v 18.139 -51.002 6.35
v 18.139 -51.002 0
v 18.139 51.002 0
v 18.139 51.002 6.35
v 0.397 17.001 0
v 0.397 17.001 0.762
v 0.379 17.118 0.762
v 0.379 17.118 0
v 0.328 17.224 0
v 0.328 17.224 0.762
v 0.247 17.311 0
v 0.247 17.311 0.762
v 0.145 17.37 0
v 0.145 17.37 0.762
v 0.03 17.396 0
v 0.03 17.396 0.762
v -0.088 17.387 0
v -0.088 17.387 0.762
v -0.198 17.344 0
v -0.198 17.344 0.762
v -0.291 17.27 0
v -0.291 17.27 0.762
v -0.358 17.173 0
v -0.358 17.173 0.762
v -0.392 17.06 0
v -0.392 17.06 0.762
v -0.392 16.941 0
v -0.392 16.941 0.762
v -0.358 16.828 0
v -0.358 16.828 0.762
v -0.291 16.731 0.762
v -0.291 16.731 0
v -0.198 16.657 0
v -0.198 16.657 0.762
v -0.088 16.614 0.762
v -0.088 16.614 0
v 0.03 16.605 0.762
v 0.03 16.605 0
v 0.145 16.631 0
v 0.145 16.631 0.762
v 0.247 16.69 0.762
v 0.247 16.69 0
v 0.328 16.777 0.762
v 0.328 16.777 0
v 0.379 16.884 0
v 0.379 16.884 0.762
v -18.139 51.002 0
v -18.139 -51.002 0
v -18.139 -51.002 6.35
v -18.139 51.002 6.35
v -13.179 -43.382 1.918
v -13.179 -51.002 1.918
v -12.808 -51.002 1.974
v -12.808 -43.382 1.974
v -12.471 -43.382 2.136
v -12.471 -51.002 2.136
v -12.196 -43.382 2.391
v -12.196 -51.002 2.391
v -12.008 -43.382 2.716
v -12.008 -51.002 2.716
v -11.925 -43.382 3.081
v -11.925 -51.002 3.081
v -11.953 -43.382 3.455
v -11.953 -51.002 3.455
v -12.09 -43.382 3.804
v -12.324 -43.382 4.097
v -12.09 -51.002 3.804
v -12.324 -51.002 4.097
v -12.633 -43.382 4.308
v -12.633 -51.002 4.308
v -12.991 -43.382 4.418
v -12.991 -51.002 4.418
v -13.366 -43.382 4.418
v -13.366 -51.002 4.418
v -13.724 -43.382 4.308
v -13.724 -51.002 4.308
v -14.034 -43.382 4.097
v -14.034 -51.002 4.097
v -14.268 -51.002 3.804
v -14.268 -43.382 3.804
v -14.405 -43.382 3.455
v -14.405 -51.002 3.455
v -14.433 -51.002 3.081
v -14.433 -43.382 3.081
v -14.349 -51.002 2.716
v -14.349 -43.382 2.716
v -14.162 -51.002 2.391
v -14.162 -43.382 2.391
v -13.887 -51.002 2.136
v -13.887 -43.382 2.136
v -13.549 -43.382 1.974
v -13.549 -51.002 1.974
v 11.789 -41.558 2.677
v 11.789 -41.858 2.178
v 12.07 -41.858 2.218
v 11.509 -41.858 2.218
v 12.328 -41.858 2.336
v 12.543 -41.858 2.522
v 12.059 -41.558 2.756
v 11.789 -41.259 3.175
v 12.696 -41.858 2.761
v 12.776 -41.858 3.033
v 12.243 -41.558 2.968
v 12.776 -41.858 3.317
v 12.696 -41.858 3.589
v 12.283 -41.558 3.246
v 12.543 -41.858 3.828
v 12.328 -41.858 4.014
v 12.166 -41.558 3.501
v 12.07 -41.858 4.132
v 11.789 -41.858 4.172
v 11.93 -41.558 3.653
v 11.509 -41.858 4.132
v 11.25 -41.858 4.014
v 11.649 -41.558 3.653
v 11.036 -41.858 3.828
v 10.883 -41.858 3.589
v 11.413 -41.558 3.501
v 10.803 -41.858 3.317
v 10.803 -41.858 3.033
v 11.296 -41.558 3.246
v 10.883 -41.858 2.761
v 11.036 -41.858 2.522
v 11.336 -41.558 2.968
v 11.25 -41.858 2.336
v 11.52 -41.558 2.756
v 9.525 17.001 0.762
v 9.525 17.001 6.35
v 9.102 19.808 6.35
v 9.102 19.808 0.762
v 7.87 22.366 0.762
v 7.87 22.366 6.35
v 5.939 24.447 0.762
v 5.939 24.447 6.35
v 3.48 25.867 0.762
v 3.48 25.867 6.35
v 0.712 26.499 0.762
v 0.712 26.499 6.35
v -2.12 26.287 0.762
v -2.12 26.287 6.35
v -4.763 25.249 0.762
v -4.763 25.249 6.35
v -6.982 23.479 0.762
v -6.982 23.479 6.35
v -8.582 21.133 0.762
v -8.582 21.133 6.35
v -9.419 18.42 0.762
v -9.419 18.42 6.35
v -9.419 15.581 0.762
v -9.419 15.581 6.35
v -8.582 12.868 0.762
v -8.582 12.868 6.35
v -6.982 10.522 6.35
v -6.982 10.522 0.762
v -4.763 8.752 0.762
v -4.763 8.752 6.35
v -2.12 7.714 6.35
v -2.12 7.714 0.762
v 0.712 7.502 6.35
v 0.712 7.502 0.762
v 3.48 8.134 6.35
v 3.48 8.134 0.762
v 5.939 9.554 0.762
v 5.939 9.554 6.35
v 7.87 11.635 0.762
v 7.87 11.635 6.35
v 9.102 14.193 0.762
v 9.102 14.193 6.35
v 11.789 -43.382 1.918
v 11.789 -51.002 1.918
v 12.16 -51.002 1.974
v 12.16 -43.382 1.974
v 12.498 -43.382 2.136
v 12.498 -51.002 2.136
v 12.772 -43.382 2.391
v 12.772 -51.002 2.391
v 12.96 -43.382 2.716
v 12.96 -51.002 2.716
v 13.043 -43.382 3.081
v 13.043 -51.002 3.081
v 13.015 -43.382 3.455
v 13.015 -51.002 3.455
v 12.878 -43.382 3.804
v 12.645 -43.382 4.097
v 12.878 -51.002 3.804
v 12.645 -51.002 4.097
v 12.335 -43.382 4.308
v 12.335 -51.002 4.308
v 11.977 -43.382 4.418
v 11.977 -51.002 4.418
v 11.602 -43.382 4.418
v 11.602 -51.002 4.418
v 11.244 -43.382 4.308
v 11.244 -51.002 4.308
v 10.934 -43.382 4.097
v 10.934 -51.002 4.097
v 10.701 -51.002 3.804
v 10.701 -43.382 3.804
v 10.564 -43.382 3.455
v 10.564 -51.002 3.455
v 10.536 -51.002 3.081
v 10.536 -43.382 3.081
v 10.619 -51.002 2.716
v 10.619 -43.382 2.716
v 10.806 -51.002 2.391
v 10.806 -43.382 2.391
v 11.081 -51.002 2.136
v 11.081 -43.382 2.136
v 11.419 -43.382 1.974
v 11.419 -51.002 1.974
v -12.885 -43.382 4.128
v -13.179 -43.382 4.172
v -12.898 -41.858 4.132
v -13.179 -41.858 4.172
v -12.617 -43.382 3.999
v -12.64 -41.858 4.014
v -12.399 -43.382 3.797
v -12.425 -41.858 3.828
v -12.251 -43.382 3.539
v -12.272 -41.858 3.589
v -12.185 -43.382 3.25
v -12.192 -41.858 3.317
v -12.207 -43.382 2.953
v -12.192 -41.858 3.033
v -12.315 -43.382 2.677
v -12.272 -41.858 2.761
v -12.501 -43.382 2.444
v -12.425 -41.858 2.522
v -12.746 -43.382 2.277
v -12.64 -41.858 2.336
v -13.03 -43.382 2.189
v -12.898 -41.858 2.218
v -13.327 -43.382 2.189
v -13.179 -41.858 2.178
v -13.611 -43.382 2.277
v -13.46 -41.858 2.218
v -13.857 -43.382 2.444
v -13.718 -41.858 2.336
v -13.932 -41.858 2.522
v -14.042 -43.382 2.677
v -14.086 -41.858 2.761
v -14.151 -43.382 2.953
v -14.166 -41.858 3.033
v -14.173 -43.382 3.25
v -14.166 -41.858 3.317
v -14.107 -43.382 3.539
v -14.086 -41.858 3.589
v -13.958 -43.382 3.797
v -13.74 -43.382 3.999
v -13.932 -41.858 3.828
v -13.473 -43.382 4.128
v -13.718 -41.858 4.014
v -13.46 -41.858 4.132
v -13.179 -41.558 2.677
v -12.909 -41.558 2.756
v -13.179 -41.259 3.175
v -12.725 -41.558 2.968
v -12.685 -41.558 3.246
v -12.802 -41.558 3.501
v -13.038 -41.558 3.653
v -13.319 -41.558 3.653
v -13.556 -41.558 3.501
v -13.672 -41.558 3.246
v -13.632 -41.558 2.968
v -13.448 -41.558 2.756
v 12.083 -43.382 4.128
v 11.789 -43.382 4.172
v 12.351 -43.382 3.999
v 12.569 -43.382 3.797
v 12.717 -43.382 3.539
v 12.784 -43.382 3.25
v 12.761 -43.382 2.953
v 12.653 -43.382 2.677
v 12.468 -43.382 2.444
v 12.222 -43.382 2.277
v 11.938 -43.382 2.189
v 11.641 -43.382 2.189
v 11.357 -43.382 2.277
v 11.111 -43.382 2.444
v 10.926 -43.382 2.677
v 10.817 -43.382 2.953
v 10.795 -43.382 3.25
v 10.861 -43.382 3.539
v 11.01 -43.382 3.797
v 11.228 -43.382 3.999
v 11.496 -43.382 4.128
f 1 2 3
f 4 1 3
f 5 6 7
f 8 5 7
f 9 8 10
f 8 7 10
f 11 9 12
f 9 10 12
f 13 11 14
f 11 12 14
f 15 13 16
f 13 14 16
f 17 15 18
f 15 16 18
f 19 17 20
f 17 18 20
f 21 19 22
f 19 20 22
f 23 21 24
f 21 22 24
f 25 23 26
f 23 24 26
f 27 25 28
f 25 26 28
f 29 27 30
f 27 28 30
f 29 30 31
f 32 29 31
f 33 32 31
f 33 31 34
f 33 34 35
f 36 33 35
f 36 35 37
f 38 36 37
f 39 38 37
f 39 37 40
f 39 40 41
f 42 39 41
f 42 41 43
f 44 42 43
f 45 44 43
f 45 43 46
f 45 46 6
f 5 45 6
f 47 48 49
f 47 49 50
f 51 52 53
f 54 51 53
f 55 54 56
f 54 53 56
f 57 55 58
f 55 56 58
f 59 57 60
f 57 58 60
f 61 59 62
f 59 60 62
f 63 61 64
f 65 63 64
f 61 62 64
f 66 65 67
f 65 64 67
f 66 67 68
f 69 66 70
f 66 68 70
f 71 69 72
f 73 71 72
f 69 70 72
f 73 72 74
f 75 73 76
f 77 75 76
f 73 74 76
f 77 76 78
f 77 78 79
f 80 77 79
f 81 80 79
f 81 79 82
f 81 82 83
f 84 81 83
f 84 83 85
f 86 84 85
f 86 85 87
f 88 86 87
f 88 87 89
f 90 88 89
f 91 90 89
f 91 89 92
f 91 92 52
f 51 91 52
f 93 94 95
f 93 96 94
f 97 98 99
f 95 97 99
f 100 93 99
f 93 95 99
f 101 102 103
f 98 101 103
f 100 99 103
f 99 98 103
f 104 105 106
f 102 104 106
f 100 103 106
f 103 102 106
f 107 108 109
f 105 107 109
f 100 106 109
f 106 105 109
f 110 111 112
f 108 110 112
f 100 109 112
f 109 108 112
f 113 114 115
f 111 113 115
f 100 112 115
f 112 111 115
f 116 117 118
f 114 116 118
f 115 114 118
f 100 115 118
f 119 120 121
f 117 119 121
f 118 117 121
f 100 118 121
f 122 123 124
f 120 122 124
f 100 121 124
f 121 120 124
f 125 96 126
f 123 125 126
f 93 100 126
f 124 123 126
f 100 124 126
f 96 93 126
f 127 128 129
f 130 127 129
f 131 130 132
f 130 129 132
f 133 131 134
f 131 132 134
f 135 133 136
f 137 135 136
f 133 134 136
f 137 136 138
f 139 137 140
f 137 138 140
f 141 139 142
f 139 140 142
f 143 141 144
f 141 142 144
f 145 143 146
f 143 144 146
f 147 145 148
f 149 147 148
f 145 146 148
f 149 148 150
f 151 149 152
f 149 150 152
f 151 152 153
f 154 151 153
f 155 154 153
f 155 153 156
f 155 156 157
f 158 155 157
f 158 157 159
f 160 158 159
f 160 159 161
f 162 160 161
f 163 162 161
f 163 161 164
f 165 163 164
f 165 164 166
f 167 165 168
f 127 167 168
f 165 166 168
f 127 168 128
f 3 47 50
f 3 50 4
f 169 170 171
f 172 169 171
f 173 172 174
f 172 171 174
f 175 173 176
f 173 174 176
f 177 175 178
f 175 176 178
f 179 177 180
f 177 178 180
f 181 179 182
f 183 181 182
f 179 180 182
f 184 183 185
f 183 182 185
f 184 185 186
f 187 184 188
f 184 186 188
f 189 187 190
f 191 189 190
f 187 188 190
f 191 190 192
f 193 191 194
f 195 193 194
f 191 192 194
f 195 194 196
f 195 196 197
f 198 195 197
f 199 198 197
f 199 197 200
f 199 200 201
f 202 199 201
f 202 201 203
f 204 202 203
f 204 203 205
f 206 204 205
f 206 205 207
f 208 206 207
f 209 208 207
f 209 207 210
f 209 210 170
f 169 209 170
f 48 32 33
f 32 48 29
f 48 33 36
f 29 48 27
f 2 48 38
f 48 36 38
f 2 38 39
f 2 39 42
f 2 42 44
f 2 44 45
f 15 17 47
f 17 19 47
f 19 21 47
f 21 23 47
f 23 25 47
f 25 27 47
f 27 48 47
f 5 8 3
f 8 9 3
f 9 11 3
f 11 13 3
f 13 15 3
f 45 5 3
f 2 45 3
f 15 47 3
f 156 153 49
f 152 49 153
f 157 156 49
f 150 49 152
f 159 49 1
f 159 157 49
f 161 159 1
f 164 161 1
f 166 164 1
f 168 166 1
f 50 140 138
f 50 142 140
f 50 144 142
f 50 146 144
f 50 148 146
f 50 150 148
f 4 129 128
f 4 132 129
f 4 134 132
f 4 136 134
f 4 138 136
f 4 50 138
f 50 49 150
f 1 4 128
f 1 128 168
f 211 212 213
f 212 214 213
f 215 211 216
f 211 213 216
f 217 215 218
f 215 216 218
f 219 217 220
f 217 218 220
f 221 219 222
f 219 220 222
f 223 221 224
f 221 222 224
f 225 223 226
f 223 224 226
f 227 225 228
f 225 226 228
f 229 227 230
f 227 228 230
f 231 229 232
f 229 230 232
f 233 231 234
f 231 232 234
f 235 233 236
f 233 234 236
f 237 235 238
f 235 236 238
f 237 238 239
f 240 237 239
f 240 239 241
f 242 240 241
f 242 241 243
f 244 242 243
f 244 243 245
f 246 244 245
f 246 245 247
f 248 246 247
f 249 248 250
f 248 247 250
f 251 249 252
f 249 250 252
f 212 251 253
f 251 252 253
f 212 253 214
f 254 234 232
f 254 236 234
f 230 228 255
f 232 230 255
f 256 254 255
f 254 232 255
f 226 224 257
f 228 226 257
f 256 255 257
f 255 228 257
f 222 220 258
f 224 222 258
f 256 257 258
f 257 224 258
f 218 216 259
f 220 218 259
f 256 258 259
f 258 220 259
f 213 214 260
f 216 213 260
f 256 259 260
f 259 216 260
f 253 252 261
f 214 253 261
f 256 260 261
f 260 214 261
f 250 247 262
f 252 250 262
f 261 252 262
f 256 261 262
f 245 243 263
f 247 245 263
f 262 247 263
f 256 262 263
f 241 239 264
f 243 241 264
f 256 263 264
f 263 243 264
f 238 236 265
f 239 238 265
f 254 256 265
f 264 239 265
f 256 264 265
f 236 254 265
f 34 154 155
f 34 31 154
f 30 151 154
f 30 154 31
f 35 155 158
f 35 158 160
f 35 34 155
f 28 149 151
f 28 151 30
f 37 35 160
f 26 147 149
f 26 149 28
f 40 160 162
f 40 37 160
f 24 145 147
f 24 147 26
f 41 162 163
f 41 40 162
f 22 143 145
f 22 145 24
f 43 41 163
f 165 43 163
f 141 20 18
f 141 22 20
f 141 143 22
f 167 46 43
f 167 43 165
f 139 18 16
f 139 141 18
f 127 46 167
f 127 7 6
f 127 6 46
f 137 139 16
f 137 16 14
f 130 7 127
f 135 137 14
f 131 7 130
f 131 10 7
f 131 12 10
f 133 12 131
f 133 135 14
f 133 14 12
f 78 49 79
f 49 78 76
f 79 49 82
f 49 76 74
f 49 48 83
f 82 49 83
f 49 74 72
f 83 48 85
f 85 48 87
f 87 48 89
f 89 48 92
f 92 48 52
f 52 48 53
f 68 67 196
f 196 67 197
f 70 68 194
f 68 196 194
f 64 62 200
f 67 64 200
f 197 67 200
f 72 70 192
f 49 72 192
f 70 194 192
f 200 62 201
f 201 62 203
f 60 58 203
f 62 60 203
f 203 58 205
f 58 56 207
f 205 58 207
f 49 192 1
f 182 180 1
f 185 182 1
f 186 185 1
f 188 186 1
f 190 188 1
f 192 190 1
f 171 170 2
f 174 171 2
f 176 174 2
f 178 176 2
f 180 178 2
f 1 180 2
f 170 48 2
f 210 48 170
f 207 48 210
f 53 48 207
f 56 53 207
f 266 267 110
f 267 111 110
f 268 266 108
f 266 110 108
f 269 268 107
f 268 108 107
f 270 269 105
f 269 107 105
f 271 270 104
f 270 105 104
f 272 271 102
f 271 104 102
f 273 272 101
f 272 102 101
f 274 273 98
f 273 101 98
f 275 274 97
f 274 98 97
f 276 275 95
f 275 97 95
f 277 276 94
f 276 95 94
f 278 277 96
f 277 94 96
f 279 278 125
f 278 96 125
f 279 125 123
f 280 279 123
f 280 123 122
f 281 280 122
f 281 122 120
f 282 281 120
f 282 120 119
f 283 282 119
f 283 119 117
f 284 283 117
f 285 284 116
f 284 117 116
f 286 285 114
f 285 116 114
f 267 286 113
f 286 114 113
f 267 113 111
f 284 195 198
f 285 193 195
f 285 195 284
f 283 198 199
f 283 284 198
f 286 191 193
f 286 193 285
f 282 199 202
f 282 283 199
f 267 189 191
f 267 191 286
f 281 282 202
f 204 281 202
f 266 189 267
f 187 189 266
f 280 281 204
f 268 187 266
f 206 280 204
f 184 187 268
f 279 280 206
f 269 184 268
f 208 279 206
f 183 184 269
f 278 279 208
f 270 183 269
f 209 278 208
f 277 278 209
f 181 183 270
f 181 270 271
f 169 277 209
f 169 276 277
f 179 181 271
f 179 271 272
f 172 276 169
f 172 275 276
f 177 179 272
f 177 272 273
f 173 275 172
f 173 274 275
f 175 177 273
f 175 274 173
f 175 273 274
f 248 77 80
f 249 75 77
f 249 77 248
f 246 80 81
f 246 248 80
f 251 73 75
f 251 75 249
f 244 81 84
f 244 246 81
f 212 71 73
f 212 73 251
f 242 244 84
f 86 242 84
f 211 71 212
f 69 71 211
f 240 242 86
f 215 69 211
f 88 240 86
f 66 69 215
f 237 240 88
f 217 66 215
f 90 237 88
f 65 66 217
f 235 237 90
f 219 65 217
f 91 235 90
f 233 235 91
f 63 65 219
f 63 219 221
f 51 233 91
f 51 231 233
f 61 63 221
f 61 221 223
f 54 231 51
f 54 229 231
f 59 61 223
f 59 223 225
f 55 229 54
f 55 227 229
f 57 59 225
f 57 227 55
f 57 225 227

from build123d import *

# Parameters (mm, degrees)
SKETCH1_W                       = 36.27882
SKETCH1_H                       = 102.003225
EXTRUDE1_DEPTH                  = 6.35
SKETCH2_R                       = 9.525
EXTRUDE2_DEPTH                  = 5.588
SKETCH3_R                       = 0.396875
EXTRUDE3_DEPTH                  = 55.419007863
F_3_48_TAPPED_HOLE1_D           = 1.9939
F_3_48_TAPPED_HOLE1_DEPTH       = 9.144
F_3_48_TAPPED_HOLE1_CBORE_D     = 2.5146
F_3_48_TAPPED_HOLE1_CBORE_DEPTH = 7.62
F_3_48_TAPPED_HOLE1_TIP         = 0.599027994


with BuildPart() as part:
    # Sketch1 → Extrude1 (new body)
    with BuildSketch(Plane.XY):
        Rectangle(SKETCH1_W, SKETCH1_H)
    extrude(amount=EXTRUDE1_DEPTH)

    # Sketch2 → Extrude2 (cut)
    with BuildSketch(Plane.XY.offset(6.35)):
        with Locations((0, 17.0005375)):
            Circle(SKETCH2_R)
    extrude(amount=-EXTRUDE2_DEPTH, mode=Mode.SUBTRACT)

    # Sketch3 → Extrude3 (cut, through all)
    with BuildSketch(Plane.XY.offset(0.762)):
        with Locations((0, 17.0005375)):
            Circle(SKETCH3_R)
    extrude(amount=-EXTRUDE3_DEPTH, mode=Mode.SUBTRACT)

    # #3-48 Tapped Hole1
    with Locations(Plane(origin=(-14.071004552, -51.0016125, -59.648711207), x_dir=(0, 0, -1), z_dir=(0, -1, 0))):
        with Locations((-62.823711207, 25.860414552), (-62.823711207, 0.892214552)):
            CounterBoreHole(F_3_48_TAPPED_HOLE1_D / 2, F_3_48_TAPPED_HOLE1_CBORE_D / 2, F_3_48_TAPPED_HOLE1_CBORE_DEPTH, depth=F_3_48_TAPPED_HOLE1_DEPTH)
            with Locations((0, 0, -(F_3_48_TAPPED_HOLE1_DEPTH + F_3_48_TAPPED_HOLE1_TIP / 2))):  # 118° drill point
                Cone(0, F_3_48_TAPPED_HOLE1_D / 2, F_3_48_TAPPED_HOLE1_TIP, mode=Mode.SUBTRACT)


solid = part.part
